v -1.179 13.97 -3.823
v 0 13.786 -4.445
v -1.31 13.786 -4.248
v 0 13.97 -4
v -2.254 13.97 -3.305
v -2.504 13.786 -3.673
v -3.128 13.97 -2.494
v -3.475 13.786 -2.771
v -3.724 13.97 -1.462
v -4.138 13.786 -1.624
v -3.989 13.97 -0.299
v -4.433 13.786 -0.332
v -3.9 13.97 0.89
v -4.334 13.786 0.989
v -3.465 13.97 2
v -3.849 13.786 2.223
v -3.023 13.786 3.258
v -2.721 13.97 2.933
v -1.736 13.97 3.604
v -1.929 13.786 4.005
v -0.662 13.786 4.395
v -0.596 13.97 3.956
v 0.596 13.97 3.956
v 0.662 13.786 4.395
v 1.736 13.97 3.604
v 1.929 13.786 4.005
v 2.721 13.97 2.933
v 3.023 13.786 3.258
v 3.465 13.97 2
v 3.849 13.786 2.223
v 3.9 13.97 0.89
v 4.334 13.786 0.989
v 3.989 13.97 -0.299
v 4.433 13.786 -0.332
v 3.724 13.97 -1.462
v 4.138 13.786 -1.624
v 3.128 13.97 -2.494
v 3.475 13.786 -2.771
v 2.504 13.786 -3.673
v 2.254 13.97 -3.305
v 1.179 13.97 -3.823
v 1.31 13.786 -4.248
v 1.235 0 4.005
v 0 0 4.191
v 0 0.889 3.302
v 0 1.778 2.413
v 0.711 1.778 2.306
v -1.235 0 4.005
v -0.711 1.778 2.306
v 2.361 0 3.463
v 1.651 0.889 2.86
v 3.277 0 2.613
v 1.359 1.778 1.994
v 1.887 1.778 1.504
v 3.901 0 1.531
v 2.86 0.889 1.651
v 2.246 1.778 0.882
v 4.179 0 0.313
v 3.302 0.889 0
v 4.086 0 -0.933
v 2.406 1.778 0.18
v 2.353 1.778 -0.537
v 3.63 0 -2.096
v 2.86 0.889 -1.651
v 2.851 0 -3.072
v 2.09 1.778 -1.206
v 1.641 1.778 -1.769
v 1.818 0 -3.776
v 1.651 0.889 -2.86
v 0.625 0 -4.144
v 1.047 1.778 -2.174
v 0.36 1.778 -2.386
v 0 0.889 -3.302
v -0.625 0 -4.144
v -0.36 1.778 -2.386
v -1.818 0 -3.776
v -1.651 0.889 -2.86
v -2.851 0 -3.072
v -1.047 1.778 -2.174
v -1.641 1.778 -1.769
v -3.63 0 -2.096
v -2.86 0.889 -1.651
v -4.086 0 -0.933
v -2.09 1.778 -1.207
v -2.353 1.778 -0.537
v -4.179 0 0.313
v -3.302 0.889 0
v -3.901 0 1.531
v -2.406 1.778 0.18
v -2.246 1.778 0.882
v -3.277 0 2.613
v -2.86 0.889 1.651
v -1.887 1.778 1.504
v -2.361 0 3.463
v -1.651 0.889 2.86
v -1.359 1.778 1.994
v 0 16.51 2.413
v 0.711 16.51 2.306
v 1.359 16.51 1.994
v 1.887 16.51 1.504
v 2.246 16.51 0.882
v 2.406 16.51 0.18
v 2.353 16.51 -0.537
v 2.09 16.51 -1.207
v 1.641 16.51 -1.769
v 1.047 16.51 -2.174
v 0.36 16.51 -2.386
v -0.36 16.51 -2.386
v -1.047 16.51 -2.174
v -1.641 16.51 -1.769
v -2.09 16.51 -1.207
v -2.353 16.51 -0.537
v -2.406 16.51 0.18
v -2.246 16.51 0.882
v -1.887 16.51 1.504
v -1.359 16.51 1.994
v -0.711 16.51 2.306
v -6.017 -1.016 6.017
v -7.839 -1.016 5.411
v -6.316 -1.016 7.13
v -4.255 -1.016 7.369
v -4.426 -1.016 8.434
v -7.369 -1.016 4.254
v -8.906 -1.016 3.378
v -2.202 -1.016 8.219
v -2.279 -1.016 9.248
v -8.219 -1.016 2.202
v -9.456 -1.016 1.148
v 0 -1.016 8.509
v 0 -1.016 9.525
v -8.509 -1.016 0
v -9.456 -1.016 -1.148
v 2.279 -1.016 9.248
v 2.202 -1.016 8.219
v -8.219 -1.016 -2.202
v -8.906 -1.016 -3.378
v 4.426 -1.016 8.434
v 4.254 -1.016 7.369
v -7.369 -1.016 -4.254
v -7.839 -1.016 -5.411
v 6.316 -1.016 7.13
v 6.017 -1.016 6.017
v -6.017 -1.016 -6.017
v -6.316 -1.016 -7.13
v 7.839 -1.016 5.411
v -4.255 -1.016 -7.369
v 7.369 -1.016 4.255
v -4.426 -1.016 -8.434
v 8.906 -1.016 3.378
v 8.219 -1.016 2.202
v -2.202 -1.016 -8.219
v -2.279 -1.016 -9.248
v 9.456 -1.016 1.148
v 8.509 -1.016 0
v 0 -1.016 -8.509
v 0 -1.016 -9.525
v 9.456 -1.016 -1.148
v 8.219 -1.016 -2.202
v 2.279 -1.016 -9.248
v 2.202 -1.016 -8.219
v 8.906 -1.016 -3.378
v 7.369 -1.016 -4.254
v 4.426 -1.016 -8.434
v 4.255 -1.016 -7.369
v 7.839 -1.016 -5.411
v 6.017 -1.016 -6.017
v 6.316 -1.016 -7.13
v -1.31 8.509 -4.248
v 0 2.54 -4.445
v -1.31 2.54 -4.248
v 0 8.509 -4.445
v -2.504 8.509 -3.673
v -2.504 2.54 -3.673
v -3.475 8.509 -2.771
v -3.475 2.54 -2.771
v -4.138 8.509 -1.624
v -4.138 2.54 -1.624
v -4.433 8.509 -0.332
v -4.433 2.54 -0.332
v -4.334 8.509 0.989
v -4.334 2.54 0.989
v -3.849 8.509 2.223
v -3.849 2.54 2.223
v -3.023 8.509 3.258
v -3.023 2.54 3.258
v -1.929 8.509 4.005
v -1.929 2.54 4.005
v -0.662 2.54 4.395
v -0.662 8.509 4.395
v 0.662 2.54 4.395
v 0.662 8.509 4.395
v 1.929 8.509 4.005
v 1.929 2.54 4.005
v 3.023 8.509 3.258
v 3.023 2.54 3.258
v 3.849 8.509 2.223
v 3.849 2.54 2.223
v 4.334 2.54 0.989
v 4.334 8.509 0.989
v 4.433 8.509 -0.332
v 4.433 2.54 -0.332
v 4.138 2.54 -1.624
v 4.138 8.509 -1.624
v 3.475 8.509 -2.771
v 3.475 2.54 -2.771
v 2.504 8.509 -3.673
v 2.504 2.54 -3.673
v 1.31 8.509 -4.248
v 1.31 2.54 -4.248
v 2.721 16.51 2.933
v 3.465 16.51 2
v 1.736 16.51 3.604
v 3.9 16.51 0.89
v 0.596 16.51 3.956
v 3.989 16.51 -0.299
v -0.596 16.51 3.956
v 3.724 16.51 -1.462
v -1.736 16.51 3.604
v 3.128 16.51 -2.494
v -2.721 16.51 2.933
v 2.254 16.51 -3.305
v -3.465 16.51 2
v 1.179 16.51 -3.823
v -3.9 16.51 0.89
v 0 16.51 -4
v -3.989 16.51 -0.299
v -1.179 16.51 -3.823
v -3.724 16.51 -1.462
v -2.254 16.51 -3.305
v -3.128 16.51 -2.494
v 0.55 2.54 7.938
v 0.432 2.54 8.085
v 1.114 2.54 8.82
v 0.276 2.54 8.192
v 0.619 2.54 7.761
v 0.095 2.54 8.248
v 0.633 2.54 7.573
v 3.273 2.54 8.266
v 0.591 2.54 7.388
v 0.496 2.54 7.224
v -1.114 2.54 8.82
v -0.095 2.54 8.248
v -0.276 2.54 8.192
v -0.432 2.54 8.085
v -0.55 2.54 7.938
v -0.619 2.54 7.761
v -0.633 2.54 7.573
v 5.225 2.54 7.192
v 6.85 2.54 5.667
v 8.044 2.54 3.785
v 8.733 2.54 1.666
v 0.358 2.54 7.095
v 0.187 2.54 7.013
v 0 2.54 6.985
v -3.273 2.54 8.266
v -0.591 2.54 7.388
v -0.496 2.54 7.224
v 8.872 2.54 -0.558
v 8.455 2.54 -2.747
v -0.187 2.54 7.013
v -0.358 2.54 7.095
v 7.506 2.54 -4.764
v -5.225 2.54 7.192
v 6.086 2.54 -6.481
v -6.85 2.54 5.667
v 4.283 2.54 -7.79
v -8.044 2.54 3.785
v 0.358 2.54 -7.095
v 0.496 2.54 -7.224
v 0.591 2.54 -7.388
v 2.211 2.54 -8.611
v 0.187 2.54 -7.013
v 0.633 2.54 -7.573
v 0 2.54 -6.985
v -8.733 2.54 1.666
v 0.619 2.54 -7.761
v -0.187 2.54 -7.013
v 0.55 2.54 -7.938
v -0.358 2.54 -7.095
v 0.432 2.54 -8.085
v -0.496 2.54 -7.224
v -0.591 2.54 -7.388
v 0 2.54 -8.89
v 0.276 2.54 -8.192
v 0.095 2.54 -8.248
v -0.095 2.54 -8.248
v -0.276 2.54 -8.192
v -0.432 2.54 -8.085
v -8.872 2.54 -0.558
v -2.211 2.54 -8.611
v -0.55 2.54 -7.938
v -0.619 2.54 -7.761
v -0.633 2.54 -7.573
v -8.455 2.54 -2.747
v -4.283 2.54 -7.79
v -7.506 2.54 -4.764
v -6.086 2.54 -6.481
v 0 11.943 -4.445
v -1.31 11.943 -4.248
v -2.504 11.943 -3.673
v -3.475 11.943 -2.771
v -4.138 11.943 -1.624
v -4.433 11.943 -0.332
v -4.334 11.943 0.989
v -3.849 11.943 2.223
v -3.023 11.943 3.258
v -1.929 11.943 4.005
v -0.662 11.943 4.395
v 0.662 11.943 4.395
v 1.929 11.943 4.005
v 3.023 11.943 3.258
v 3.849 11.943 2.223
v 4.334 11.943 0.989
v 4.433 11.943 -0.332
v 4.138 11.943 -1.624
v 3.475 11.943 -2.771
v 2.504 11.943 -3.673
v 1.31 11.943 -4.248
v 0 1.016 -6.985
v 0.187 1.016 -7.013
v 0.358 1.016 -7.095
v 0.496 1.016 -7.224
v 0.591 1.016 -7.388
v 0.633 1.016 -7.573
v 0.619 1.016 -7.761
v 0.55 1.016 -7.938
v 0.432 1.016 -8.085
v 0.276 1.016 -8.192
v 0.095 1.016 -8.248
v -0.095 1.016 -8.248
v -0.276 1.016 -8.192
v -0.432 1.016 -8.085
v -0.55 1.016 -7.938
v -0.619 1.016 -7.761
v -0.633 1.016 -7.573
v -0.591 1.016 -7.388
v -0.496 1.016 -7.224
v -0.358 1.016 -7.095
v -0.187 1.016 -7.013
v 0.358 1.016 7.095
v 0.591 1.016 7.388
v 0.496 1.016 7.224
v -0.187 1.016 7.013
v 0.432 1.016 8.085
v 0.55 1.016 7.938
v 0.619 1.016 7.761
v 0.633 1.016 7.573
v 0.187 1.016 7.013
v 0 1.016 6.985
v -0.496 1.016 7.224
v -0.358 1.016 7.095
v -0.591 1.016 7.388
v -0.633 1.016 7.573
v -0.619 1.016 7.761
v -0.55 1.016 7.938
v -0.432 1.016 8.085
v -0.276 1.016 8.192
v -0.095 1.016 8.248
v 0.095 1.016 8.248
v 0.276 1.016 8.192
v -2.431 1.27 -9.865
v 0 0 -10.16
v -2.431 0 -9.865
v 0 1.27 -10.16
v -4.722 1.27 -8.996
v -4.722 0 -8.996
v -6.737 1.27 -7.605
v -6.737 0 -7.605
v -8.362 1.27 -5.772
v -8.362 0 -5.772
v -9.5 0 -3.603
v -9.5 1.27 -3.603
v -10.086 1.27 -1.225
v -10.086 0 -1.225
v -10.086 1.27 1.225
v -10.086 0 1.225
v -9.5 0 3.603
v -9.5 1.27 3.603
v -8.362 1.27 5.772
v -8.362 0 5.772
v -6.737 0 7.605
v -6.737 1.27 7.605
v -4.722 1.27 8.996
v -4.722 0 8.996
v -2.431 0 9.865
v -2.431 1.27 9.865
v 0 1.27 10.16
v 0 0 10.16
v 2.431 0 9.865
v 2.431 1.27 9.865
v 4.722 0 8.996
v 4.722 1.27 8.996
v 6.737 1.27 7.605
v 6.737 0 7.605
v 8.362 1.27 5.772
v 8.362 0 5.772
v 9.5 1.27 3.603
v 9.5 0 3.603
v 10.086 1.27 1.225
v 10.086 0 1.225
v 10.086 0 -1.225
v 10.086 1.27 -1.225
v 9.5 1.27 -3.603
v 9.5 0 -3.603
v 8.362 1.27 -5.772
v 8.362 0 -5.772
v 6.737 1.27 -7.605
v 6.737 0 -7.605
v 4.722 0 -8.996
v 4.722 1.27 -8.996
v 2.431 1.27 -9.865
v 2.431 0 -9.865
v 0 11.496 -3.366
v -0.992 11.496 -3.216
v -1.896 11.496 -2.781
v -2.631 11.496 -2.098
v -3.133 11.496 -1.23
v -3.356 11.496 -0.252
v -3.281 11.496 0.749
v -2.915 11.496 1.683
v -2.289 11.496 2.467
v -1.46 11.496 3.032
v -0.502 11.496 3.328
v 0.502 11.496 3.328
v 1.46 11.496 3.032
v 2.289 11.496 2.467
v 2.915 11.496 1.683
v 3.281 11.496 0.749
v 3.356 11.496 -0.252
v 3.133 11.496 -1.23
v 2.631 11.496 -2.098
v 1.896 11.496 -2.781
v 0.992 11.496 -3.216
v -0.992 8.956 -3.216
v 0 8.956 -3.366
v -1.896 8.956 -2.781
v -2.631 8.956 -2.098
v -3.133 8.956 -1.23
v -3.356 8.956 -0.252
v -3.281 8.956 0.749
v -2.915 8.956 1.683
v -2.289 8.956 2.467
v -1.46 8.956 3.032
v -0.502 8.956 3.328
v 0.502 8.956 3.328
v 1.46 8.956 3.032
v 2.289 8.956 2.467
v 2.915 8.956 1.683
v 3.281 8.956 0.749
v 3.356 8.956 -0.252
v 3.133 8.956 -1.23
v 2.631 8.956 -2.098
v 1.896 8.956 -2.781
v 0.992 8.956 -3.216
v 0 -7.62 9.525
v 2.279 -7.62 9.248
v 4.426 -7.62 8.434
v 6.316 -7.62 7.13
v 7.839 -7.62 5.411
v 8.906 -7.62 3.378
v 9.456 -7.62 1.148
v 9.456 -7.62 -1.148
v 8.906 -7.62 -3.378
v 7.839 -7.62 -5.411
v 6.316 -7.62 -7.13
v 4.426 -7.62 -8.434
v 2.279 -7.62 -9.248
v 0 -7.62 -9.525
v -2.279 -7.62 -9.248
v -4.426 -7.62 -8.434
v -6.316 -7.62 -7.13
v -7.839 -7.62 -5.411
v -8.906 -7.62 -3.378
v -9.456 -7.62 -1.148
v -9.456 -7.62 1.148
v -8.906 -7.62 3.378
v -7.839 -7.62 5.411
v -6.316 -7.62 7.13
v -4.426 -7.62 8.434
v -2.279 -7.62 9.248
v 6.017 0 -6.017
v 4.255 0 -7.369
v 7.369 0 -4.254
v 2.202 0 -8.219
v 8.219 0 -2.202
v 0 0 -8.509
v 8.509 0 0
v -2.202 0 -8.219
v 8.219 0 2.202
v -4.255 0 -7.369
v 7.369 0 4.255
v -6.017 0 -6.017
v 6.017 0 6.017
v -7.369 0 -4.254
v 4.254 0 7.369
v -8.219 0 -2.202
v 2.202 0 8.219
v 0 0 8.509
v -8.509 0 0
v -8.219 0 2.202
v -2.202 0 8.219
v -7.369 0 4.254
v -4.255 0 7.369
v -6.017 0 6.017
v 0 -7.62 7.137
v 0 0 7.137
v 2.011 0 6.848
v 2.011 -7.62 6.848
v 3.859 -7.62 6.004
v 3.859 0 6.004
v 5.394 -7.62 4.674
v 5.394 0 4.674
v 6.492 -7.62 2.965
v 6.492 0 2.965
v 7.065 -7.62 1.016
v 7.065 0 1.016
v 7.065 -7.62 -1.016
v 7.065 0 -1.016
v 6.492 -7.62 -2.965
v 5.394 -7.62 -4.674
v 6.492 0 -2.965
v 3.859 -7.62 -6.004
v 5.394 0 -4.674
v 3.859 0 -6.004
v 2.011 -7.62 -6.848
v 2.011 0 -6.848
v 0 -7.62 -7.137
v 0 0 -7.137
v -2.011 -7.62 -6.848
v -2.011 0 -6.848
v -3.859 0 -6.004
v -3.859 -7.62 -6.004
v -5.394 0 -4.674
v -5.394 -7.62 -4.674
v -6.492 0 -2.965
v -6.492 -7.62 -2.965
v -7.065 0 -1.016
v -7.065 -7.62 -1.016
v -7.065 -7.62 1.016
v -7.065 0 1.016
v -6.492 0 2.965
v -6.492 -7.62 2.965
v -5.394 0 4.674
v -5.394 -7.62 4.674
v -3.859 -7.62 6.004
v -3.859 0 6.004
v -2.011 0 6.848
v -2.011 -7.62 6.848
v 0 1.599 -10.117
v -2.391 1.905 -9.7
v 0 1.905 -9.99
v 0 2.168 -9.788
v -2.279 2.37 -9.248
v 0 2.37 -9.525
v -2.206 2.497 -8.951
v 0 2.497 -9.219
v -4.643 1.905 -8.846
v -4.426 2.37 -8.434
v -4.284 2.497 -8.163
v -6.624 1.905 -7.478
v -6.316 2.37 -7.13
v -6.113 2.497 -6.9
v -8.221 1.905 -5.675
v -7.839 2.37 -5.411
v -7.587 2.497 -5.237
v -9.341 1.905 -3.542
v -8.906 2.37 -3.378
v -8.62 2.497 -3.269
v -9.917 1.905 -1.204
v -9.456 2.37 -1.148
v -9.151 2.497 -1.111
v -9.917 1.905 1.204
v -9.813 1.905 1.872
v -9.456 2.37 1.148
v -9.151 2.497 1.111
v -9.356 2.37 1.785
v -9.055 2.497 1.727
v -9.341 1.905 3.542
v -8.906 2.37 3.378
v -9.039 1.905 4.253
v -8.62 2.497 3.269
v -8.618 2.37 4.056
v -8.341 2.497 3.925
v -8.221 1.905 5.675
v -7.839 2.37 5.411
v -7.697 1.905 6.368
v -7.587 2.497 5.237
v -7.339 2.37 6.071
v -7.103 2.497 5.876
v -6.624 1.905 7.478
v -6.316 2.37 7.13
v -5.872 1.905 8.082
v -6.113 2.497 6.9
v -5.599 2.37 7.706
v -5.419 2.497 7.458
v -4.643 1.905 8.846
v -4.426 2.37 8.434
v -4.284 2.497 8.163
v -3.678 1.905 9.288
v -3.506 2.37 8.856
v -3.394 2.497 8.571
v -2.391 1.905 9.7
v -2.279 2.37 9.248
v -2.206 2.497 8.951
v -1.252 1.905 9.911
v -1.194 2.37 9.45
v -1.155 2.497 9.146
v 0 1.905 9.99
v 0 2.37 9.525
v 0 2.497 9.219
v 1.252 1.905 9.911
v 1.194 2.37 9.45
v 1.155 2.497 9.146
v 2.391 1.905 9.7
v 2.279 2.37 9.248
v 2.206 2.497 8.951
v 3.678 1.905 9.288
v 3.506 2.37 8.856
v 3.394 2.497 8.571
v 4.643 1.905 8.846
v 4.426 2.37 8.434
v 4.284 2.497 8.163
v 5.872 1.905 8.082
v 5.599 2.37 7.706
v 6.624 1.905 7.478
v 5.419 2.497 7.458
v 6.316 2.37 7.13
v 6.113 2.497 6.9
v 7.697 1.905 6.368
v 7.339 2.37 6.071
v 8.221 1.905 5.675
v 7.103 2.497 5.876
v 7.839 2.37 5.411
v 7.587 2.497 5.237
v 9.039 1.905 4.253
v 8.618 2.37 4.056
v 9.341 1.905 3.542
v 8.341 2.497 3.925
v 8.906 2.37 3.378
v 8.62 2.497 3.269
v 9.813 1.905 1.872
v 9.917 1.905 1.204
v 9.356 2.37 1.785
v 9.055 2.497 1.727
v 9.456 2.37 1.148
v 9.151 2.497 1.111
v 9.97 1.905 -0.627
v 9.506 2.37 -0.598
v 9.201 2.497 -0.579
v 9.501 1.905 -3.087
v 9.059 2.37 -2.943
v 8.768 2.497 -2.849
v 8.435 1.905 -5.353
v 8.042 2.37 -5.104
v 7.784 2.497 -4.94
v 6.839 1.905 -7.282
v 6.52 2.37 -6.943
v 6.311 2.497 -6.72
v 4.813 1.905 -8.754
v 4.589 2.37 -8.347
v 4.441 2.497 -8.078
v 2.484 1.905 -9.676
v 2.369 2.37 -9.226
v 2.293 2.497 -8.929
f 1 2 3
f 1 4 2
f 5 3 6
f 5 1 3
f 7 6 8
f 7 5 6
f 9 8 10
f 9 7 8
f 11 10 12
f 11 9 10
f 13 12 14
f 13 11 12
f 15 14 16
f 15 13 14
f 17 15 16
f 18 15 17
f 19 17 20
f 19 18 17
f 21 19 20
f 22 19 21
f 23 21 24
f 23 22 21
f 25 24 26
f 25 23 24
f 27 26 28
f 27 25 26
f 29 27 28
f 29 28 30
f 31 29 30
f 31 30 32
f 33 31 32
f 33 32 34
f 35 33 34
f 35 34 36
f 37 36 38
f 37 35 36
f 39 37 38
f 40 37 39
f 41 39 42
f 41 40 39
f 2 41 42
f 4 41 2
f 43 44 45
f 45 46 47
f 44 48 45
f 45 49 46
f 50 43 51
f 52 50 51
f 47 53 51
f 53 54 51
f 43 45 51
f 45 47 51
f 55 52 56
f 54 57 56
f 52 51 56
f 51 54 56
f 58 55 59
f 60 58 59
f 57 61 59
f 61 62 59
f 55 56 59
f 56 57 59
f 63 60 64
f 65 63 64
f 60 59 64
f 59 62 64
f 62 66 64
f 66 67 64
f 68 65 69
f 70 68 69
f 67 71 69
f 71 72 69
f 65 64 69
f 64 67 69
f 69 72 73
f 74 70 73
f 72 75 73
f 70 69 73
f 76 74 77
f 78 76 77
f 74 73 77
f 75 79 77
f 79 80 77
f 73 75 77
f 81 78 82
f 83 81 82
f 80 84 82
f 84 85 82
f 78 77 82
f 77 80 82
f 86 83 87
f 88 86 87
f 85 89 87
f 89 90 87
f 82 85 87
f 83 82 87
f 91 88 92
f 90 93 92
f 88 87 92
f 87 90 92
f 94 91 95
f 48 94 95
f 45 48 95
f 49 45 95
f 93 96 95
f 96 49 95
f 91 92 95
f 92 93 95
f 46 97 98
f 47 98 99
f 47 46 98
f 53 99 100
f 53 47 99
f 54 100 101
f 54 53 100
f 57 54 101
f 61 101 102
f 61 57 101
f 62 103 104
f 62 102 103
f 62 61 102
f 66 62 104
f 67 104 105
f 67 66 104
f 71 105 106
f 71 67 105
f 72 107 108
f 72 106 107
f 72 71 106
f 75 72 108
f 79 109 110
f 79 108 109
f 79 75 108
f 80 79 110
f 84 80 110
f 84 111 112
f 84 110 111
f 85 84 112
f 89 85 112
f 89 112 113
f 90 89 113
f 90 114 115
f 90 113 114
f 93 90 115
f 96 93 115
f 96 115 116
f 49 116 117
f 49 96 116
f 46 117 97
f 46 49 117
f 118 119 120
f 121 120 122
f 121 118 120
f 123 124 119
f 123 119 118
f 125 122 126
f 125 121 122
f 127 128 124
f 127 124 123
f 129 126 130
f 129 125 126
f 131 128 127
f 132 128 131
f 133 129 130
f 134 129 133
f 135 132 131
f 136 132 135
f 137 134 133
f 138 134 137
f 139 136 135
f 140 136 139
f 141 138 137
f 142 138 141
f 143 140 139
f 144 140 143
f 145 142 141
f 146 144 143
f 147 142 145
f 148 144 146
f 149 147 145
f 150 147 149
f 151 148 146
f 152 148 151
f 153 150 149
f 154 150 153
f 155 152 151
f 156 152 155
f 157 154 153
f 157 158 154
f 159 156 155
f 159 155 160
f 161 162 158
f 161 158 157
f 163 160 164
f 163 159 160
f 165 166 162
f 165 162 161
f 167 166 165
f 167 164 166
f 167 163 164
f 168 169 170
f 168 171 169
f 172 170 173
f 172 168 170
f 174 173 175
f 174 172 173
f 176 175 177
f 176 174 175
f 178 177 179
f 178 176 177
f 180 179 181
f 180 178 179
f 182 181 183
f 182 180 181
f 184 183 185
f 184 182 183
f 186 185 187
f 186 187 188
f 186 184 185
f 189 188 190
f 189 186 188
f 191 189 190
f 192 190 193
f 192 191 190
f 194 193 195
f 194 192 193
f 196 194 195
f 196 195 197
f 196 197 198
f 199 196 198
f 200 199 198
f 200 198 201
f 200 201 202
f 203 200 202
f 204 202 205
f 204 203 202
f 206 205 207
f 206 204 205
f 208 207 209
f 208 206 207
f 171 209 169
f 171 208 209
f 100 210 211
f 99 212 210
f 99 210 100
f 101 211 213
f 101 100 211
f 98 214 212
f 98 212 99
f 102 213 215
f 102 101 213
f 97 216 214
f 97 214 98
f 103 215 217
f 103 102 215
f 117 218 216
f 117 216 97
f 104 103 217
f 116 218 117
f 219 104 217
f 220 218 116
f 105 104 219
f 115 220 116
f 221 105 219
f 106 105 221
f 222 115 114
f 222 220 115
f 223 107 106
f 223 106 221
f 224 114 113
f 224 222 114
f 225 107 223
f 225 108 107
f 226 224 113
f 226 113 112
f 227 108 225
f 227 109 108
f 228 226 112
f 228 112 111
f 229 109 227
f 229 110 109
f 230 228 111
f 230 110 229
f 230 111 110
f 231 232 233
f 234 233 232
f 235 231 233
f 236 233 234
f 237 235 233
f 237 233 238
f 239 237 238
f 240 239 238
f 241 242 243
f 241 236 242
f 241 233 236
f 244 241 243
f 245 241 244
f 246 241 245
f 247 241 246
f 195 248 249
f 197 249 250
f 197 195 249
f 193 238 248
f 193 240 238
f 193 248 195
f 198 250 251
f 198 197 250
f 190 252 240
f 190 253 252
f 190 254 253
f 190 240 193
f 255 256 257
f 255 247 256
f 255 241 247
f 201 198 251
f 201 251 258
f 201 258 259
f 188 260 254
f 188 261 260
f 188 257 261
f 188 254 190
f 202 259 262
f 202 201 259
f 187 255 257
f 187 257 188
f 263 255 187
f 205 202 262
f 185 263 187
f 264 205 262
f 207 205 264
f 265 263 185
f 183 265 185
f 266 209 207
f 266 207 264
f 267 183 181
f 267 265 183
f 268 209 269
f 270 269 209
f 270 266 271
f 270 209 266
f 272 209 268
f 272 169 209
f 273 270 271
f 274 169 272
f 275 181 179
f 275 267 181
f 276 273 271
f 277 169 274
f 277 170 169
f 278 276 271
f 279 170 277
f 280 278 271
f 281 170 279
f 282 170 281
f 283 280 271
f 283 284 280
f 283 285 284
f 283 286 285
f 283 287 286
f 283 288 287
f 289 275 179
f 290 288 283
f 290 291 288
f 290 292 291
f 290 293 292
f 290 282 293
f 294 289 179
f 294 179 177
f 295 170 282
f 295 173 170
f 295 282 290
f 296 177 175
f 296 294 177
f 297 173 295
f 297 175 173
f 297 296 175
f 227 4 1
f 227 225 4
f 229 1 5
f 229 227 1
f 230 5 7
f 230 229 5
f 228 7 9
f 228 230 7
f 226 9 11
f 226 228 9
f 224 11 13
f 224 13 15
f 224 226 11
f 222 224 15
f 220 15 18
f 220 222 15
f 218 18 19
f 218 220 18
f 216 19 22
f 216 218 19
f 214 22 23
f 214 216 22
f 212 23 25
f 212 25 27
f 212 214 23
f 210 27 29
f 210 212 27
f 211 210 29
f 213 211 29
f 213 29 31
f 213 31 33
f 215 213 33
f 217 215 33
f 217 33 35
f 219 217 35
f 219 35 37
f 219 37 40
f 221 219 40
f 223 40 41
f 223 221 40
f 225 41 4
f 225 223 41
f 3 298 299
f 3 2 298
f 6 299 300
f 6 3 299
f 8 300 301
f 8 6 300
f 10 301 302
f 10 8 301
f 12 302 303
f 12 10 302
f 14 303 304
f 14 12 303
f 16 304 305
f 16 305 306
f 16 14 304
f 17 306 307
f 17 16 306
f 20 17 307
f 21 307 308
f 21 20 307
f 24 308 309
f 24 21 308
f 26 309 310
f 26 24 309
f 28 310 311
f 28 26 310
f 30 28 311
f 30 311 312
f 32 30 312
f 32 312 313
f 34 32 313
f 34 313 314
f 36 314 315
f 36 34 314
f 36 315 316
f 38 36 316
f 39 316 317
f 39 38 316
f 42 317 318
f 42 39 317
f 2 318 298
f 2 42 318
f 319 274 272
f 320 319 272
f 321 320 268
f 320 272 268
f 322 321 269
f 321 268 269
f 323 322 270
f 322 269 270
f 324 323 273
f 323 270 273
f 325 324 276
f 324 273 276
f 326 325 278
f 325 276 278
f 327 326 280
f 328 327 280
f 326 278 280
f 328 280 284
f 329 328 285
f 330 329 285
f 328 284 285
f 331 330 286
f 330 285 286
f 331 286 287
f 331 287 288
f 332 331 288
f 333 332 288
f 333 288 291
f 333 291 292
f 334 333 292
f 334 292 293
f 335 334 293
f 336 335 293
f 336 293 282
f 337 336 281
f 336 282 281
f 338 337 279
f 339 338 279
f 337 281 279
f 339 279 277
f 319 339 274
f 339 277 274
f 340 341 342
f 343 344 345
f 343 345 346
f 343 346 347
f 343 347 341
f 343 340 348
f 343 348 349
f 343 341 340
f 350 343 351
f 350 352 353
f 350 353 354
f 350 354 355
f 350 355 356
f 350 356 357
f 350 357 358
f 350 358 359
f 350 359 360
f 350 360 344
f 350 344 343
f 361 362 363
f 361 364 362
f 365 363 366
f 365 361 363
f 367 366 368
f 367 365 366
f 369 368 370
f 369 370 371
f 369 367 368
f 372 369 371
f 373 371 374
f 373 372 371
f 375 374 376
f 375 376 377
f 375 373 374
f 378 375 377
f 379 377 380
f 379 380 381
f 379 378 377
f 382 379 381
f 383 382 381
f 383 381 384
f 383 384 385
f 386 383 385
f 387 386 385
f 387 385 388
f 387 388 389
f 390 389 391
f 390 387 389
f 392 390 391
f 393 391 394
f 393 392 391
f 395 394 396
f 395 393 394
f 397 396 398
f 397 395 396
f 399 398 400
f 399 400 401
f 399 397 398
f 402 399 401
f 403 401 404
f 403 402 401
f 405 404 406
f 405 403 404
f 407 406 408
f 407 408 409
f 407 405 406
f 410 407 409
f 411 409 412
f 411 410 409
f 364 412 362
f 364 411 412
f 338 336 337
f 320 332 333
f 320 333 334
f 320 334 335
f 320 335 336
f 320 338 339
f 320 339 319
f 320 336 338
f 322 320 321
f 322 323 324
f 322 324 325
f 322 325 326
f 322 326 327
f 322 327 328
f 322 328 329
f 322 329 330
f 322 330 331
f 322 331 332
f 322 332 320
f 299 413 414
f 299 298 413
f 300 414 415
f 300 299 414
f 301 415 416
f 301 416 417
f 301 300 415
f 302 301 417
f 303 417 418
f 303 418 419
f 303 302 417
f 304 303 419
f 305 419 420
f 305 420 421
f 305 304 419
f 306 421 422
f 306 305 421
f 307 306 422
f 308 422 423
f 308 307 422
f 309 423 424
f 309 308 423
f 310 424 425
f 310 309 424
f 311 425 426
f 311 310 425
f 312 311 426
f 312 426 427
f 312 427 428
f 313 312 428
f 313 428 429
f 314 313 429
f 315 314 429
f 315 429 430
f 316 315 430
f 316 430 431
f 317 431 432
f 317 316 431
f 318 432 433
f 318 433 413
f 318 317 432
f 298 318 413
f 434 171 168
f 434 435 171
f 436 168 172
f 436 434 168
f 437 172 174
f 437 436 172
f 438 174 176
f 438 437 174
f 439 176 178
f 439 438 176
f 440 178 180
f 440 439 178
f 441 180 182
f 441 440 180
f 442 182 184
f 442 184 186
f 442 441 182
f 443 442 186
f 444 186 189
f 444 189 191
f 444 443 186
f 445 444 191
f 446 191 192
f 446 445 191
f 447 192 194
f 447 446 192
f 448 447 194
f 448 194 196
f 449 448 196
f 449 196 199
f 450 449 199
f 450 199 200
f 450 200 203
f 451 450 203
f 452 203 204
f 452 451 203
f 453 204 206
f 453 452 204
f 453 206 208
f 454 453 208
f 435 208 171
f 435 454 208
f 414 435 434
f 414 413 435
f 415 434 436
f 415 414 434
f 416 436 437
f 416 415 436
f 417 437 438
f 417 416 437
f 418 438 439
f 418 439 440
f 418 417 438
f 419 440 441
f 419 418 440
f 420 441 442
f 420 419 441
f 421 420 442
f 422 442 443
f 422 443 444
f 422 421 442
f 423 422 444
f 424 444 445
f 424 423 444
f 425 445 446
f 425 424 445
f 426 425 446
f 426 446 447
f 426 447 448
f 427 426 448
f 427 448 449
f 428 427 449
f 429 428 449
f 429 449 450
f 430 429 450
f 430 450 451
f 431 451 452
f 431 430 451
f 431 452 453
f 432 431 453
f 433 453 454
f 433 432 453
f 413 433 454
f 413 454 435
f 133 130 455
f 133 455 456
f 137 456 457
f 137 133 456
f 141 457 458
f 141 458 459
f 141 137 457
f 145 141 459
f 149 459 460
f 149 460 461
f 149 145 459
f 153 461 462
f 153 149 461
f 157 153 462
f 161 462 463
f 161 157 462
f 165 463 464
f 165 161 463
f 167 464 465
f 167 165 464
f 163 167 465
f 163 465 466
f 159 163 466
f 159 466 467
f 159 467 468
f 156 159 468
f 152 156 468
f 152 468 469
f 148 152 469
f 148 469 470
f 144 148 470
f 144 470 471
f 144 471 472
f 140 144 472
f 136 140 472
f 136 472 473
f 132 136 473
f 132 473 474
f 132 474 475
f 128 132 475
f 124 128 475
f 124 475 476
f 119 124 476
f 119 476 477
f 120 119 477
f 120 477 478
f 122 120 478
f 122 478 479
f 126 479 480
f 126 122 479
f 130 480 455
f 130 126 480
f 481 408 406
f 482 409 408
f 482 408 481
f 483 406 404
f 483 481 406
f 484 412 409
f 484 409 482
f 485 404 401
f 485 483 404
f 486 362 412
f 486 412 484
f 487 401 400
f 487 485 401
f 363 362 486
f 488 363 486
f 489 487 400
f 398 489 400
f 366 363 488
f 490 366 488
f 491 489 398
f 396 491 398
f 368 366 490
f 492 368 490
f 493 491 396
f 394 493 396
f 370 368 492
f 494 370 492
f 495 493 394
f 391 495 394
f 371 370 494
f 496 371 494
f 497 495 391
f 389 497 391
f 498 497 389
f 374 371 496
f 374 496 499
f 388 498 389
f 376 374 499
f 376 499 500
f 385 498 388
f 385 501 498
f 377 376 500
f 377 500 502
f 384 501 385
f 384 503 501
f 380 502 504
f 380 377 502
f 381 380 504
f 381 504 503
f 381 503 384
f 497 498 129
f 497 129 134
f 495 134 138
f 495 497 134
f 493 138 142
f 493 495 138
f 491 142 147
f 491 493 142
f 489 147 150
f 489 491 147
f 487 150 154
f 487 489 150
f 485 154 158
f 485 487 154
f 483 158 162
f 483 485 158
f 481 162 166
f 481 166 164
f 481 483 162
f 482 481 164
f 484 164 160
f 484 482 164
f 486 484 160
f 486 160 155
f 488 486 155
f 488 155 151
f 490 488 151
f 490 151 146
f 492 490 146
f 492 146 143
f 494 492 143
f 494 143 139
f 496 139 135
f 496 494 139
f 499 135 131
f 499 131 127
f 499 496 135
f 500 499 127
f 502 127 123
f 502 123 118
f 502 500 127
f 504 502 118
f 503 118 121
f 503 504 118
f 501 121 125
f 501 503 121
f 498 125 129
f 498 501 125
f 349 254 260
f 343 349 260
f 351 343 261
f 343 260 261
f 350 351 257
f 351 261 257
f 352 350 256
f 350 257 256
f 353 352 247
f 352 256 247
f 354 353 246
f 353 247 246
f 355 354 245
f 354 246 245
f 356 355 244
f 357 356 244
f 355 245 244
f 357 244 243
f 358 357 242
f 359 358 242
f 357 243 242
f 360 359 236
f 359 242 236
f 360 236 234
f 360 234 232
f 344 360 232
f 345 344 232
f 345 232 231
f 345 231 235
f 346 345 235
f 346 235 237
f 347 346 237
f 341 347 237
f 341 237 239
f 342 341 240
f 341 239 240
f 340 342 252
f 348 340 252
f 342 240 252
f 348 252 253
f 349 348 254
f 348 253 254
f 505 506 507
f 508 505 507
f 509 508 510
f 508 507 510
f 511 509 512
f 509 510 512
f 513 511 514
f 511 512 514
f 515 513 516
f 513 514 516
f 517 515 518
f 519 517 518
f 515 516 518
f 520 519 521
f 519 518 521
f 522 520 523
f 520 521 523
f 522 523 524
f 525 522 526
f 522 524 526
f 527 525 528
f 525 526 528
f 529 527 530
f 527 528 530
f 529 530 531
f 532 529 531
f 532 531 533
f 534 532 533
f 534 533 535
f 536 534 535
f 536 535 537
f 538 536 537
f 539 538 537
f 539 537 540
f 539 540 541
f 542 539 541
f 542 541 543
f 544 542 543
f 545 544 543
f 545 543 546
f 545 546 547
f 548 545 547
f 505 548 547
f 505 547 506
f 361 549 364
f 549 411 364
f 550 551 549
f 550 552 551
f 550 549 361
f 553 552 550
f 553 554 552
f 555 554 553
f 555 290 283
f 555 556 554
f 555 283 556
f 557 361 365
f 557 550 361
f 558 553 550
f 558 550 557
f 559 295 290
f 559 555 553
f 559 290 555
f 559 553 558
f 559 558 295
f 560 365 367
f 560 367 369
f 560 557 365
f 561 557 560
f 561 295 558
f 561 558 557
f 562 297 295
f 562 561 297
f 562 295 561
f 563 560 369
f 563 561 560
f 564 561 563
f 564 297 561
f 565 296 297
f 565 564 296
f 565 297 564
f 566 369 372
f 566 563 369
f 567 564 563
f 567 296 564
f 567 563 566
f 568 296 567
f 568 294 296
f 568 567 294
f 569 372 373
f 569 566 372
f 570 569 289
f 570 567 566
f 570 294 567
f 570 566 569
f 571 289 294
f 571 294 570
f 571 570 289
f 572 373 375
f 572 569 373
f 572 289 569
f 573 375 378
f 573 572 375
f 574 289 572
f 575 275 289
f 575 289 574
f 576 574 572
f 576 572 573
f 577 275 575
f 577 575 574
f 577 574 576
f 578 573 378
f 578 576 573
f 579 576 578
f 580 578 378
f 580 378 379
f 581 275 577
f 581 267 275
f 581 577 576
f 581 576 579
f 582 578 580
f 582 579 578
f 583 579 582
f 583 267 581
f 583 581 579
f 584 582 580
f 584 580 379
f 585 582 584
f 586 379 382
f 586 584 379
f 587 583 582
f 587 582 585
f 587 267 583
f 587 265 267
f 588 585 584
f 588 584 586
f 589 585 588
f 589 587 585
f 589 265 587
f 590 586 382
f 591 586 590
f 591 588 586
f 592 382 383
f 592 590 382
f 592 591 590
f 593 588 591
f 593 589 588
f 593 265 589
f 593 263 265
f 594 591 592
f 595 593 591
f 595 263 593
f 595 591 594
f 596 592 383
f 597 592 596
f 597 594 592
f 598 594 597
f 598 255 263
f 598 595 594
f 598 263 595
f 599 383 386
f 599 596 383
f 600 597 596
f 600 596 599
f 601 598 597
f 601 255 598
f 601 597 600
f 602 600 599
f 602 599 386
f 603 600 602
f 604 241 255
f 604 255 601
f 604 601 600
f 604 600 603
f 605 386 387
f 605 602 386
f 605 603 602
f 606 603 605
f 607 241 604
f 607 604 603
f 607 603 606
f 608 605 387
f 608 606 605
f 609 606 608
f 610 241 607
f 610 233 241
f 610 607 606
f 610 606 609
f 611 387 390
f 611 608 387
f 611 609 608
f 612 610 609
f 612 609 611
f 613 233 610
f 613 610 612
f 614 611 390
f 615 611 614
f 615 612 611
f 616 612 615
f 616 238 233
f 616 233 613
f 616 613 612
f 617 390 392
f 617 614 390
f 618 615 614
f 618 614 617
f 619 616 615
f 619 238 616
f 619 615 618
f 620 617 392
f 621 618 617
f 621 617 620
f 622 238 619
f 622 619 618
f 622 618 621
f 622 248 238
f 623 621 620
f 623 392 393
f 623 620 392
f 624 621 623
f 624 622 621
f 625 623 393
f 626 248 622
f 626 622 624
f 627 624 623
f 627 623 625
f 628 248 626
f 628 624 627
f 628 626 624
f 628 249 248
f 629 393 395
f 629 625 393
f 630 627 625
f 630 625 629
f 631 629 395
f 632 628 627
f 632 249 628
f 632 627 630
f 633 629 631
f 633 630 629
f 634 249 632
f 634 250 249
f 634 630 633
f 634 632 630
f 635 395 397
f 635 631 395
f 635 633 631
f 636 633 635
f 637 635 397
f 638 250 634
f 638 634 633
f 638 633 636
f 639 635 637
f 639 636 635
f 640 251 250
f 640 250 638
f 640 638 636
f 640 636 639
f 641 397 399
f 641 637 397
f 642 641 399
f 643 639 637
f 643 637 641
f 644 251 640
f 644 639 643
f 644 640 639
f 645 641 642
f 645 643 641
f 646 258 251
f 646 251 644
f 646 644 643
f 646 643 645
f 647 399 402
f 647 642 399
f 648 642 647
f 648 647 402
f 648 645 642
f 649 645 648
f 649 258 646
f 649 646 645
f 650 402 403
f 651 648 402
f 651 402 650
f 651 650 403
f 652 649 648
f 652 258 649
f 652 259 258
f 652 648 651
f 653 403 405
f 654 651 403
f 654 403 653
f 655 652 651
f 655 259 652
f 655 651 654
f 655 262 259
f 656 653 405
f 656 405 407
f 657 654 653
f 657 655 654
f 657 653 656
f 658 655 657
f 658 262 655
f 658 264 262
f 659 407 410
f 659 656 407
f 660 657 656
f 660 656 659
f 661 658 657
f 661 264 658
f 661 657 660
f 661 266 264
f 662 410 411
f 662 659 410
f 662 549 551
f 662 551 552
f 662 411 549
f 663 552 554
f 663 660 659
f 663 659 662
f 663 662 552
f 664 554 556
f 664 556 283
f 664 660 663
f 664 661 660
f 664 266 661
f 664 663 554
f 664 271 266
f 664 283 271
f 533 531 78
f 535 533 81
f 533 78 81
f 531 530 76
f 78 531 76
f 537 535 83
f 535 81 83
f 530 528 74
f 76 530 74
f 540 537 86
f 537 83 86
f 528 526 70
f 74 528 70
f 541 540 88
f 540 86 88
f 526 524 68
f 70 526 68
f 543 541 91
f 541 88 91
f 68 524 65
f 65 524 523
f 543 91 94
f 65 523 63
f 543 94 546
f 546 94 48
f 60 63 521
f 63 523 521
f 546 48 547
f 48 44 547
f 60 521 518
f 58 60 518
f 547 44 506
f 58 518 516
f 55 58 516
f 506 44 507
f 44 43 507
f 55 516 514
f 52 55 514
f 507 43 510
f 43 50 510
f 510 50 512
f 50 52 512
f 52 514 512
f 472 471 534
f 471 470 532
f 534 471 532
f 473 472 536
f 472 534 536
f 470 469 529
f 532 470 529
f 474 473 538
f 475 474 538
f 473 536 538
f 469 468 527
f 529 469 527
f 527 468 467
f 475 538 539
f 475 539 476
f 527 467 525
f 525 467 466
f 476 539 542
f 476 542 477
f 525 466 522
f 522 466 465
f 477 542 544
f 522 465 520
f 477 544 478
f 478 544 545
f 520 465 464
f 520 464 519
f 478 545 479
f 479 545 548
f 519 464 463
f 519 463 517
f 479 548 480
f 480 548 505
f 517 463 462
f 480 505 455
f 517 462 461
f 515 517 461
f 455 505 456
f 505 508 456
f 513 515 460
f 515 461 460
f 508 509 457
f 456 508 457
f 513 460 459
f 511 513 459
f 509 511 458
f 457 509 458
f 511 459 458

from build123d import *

# Parameters (mm, degrees)
SKETCH1_R           = 9.525
SHAFT_DEPTH         = 7.62
SKETCH11_R          = 9.779
SKETCH11_R_2        = 8.509
THREAD_RECESS_DEPTH = 1.016
SKETCH13_R          = 7.1374
LARGE_HOLE_DEPTH    = 22.88678373
SKETCH14_R          = 2.413
SMALL_HOLE_DEPTH    = 22.88678373
CHAMFER1_SIZE       = 1.778
SKETCH15_R          = 0.635
TOOL_HOLES_DEPTH    = 1.524


with BuildPart() as part:
    # Sketch1 → Shaft (new body)
    with BuildSketch(Plane(origin=(0, 0, 0), x_dir=(1, 0, 0), z_dir=(0, 1, 0))):
        Circle(SKETCH1_R)
    extrude(amount=-SHAFT_DEPTH)

    # Sketch11 → Thread Recess (cut)
    with BuildSketch(Plane(origin=(0, 0, 0), x_dir=(1, 0, 0), z_dir=(0, 1, 0))):
        Circle(SKETCH11_R)
        Circle(SKETCH11_R_2, mode=Mode.SUBTRACT)
    extrude(amount=-THREAD_RECESS_DEPTH, mode=Mode.SUBTRACT)

    # Sketch12 → Standard Connector (revolve)
    with BuildSketch(Plane.XY):
        with BuildLine():
            Line((0, 0), (10.16, 0))
            Line((10.16, 0), (10.16, 1.27))
            ThreePointArc((10.16, 1.27), (9.788025612, 2.168025612), (8.89, 2.54))
            Line((8.89, 2.54), (4.445, 2.54))
            Line((4.445, 2.54), (4.445, 8.509))
            Line((4.445, 8.509), (3.3655, 8.956143541))
            Line((3.3655, 8.956143541), (3.3655, 11.496143541))
            Line((3.3655, 11.496143541), (4.445, 11.943287081))
            Line((4.445, 11.943287081), (4.445, 13.785882072))
            Line((4.445, 13.785882072), (4.0005, 13.97))
            Line((4.0005, 13.97), (4.0005, 16.51))
            Line((4.0005, 16.51), (0, 16.51))
            Line((0, 16.51), (0, 0))
        make_face()
    revolve(axis=Axis((0, 0, 0), (0, 1, 0)))

    # Sketch13 → Large Hole (cut, through all)
    with BuildSketch(Plane(origin=(0, 0, 0), x_dir=(1, 0, 0), z_dir=(0, 1, 0))):
        Circle(SKETCH13_R)
    extrude(amount=-LARGE_HOLE_DEPTH, mode=Mode.SUBTRACT)

    # Sketch14 → Small Hole (cut, through all)
    with BuildSketch(Plane(origin=(0, 0, 0), x_dir=(1, 0, 0), z_dir=(0, 1, 0))):
        Circle(SKETCH14_R)
    extrude(amount=SMALL_HOLE_DEPTH, mode=Mode.SUBTRACT)

    # Chamfer1
    chamfer1_edges = [part.edges().sort_by_distance(p)[0] for p in [
        (-2.413, 0, 0),
    ]]
    chamfer(chamfer1_edges, length=CHAMFER1_SIZE)

    # Sketch15 → Tool Holes (cut)
    with BuildSketch(Plane(origin=(0, 2.54, 0), x_dir=(-1, 0, 0), z_dir=(0, 1, 0))):
        with Locations((0, -7.62)):
            Circle(SKETCH15_R)
        with Locations((0, 7.62)):
            Circle(SKETCH15_R)
    extrude(amount=-TOOL_HOLES_DEPTH, mode=Mode.SUBTRACT)


solid = part.part
